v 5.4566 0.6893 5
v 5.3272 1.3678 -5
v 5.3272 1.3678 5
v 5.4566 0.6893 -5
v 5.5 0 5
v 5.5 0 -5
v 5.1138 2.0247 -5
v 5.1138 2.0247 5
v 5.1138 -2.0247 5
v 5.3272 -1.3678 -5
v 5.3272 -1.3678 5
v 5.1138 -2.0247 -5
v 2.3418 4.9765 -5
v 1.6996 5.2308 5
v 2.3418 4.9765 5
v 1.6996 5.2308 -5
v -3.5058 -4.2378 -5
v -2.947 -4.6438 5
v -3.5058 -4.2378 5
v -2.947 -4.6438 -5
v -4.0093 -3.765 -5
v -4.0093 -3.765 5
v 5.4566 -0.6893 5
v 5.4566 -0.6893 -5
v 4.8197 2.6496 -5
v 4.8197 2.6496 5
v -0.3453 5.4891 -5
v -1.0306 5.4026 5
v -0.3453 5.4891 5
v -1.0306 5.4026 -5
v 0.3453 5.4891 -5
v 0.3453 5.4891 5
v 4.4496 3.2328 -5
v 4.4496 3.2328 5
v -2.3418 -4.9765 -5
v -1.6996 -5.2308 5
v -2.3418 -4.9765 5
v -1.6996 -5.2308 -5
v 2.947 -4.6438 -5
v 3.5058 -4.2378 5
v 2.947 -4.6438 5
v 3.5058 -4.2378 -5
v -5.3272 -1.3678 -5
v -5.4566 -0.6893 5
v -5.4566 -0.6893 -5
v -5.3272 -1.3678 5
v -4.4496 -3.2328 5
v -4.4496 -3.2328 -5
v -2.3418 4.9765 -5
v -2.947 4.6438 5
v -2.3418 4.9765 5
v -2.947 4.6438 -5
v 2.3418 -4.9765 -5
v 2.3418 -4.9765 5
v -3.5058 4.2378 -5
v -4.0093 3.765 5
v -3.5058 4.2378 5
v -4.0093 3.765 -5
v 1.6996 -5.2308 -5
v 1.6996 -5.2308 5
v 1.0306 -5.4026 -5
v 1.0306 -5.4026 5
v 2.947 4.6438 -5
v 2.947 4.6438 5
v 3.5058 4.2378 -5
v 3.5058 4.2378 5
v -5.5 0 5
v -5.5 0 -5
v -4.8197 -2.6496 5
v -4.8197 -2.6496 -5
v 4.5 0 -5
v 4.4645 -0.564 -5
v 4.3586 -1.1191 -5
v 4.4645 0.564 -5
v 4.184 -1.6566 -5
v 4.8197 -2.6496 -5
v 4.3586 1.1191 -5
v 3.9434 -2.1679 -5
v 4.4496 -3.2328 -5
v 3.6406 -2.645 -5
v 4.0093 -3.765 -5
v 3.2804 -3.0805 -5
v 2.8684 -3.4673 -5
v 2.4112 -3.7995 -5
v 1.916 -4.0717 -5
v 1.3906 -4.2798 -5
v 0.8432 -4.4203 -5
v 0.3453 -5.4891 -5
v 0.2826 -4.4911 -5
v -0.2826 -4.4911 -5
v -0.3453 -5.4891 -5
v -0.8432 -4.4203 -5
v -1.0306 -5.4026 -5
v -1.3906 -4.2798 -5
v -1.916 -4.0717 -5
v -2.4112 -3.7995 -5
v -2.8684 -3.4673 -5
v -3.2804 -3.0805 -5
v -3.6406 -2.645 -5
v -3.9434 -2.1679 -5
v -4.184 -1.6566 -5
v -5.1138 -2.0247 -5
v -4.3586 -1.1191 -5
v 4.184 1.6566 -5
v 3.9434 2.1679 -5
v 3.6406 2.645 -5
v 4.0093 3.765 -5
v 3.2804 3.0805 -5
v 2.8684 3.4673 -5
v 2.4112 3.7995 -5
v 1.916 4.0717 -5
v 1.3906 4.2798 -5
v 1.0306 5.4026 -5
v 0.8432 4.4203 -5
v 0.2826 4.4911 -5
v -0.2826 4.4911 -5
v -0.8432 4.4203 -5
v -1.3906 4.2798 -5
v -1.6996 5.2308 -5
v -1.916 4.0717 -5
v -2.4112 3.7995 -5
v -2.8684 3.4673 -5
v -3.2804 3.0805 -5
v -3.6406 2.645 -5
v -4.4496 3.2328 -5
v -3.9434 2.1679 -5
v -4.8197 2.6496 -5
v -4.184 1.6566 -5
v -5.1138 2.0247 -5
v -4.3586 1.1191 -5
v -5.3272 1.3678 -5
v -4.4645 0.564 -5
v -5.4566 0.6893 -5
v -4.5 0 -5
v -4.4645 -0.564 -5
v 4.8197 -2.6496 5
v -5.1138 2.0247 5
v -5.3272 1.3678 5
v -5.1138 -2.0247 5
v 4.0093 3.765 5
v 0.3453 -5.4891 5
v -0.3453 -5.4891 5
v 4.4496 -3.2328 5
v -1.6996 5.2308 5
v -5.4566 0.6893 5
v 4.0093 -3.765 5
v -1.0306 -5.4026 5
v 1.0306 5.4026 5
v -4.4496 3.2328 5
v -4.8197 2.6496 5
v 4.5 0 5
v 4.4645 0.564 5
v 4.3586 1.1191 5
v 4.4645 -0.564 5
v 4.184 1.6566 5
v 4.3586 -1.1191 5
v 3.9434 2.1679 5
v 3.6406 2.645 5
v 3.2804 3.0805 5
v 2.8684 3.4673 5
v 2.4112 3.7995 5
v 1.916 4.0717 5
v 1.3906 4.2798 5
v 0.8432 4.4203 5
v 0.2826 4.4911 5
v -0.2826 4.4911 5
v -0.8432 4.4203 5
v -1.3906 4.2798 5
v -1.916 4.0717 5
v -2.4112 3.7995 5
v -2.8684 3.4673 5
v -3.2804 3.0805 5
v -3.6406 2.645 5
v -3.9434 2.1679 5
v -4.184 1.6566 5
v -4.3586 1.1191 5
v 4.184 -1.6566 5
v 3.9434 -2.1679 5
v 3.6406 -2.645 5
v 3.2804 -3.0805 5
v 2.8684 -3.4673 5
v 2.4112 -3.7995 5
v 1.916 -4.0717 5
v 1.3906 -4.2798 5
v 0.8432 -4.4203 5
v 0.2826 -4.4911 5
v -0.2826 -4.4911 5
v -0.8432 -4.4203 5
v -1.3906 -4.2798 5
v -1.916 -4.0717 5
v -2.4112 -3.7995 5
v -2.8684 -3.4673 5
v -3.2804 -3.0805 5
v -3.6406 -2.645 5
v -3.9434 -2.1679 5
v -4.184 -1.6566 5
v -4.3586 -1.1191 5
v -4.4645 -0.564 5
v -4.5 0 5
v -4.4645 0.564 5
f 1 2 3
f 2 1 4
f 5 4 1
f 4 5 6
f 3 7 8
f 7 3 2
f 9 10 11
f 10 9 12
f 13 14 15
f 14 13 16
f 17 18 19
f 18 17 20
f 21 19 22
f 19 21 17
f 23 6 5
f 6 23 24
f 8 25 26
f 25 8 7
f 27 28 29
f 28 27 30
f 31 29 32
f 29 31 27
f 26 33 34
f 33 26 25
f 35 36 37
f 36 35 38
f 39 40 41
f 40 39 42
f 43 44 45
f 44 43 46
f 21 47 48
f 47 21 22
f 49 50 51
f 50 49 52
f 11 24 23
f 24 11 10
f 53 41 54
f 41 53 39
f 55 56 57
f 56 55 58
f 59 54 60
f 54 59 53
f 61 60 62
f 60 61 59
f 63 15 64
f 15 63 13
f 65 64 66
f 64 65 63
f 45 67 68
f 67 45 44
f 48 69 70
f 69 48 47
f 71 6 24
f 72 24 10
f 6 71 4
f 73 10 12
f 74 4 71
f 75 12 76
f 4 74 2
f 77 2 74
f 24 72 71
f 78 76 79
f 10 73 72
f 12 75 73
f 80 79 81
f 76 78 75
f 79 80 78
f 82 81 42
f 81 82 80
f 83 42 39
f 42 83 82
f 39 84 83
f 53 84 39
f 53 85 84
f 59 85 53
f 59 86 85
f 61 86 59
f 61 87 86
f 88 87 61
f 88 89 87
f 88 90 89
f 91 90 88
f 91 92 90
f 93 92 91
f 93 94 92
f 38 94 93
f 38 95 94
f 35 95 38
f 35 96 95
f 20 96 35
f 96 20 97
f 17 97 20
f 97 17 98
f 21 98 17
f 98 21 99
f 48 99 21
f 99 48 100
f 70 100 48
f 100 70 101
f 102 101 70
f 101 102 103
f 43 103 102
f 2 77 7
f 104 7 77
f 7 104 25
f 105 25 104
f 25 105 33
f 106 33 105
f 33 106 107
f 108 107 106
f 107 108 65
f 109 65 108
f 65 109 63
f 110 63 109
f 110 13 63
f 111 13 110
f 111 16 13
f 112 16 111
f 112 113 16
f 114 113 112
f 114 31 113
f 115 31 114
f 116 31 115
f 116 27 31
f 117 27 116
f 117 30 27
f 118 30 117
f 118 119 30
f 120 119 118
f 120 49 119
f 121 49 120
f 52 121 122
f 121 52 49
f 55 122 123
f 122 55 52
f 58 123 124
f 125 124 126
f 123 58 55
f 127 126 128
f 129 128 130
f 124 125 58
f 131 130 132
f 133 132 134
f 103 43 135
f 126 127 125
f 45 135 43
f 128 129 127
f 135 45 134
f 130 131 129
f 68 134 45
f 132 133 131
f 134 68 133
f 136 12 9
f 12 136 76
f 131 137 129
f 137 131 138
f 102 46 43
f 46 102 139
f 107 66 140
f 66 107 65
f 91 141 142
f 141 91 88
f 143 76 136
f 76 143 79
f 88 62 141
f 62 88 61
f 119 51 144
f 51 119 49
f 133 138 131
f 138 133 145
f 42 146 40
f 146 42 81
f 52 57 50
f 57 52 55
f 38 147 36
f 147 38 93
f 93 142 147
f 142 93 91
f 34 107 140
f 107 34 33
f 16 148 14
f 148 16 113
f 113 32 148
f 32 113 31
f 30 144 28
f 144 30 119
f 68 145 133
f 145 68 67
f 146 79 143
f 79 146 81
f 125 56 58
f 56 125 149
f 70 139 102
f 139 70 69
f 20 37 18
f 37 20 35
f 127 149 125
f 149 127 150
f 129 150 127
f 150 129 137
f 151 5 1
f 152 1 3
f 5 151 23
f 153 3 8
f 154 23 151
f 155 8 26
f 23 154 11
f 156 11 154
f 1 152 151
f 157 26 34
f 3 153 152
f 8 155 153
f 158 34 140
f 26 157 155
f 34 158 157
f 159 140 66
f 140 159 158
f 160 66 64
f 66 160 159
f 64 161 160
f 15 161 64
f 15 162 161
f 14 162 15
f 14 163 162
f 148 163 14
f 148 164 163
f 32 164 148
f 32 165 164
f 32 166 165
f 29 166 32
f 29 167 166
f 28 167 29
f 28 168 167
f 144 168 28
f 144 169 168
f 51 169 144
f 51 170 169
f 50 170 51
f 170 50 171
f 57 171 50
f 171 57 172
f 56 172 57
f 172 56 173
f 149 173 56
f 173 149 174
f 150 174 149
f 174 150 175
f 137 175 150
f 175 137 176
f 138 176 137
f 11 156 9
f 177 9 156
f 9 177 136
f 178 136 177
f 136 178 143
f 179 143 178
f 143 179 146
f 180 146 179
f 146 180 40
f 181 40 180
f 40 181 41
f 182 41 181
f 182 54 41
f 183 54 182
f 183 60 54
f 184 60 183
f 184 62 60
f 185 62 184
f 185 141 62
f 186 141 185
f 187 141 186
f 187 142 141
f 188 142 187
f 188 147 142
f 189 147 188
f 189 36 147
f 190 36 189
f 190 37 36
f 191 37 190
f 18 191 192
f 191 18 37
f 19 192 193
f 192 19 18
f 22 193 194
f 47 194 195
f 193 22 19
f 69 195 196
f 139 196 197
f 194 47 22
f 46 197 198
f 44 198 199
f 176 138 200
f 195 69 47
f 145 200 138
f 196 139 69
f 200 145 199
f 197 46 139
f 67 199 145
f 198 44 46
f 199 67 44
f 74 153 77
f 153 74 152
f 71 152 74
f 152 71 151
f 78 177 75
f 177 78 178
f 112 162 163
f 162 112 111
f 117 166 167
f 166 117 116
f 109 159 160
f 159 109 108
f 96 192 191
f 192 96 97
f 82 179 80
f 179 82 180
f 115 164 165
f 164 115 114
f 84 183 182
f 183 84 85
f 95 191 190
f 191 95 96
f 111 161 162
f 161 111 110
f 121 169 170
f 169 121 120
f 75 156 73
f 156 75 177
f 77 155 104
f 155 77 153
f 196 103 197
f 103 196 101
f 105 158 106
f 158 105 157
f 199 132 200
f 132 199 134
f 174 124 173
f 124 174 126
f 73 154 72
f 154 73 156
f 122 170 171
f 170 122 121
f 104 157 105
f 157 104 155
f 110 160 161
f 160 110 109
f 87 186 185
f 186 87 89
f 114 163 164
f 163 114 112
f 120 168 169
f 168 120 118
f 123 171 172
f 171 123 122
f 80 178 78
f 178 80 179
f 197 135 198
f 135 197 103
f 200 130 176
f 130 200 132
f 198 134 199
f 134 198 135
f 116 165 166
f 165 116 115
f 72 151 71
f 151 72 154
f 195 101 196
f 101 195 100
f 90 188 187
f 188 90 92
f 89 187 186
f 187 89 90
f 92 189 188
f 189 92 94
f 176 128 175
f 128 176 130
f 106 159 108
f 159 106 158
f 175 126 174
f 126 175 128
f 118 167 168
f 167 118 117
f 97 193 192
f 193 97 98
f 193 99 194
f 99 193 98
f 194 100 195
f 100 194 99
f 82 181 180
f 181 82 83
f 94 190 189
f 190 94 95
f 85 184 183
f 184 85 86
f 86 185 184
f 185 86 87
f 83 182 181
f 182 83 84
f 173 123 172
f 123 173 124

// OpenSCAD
$fn = 50;


difference() {
	union() {
		translate(v = [0, 0, -5.0000000000]) {
			cylinder(h = 10, r = 5.5000000000);
		}
	}
	union() {
		translate(v = [0, 0, -100.0000000000]) {
			cylinder(h = 200, r = 4.5000000000);
		}
	}
}
